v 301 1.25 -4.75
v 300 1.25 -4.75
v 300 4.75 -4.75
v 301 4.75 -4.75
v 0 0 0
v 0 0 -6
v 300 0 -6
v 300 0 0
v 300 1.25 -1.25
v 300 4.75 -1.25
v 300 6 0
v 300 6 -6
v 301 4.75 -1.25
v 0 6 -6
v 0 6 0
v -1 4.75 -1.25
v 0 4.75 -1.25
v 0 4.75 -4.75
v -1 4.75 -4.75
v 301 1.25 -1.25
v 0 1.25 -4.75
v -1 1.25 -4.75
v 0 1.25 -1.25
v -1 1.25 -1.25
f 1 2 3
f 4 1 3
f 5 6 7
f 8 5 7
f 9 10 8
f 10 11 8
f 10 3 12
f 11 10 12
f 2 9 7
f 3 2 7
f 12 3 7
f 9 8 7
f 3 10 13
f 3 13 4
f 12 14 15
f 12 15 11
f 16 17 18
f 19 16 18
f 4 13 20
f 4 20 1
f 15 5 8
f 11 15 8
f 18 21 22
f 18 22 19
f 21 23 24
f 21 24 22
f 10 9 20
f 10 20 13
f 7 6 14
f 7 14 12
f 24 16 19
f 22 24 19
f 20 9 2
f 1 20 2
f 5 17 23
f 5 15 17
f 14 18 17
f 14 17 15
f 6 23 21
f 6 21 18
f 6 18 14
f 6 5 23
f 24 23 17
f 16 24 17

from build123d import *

# Parameters (mm, degrees)
SKETCH1_W           = 300
SKETCH1_H           = 6
BOSS_EXTRUDE1_DEPTH = 6
SKETCH3_W           = 3.5
SKETCH3_H           = 3.5
BOSS_EXTRUDE2_DEPTH = 1


with BuildPart() as part:
    # Sketch1 → Boss-Extrude1 (new body)
    with BuildSketch(Plane(origin=(0, 0, 0), x_dir=(1, 0, 0), z_dir=(0, 1, 0))):
        with Locations((150, 3)):
            Rectangle(SKETCH1_W, SKETCH1_H)
    extrude(amount=BOSS_EXTRUDE1_DEPTH)

    # Sketch3 → Boss-Extrude2 (add)
    with BuildSketch(Plane(origin=(300, 0, 0), x_dir=(0, 0, -1), z_dir=(1, 0, 0))):
        with Locations((3, 3)):
            Rectangle(SKETCH3_W, SKETCH3_H)
    boss_extrude2 = extrude(amount=BOSS_EXTRUDE2_DEPTH)

    # Mirror1: Boss-Extrude2 across plane
    add(boss_extrude2.mirror(Plane(origin=(150, 0, 0), x_dir=(0, 0, 1), z_dir=(1, 0, 0))))


solid = part.part
